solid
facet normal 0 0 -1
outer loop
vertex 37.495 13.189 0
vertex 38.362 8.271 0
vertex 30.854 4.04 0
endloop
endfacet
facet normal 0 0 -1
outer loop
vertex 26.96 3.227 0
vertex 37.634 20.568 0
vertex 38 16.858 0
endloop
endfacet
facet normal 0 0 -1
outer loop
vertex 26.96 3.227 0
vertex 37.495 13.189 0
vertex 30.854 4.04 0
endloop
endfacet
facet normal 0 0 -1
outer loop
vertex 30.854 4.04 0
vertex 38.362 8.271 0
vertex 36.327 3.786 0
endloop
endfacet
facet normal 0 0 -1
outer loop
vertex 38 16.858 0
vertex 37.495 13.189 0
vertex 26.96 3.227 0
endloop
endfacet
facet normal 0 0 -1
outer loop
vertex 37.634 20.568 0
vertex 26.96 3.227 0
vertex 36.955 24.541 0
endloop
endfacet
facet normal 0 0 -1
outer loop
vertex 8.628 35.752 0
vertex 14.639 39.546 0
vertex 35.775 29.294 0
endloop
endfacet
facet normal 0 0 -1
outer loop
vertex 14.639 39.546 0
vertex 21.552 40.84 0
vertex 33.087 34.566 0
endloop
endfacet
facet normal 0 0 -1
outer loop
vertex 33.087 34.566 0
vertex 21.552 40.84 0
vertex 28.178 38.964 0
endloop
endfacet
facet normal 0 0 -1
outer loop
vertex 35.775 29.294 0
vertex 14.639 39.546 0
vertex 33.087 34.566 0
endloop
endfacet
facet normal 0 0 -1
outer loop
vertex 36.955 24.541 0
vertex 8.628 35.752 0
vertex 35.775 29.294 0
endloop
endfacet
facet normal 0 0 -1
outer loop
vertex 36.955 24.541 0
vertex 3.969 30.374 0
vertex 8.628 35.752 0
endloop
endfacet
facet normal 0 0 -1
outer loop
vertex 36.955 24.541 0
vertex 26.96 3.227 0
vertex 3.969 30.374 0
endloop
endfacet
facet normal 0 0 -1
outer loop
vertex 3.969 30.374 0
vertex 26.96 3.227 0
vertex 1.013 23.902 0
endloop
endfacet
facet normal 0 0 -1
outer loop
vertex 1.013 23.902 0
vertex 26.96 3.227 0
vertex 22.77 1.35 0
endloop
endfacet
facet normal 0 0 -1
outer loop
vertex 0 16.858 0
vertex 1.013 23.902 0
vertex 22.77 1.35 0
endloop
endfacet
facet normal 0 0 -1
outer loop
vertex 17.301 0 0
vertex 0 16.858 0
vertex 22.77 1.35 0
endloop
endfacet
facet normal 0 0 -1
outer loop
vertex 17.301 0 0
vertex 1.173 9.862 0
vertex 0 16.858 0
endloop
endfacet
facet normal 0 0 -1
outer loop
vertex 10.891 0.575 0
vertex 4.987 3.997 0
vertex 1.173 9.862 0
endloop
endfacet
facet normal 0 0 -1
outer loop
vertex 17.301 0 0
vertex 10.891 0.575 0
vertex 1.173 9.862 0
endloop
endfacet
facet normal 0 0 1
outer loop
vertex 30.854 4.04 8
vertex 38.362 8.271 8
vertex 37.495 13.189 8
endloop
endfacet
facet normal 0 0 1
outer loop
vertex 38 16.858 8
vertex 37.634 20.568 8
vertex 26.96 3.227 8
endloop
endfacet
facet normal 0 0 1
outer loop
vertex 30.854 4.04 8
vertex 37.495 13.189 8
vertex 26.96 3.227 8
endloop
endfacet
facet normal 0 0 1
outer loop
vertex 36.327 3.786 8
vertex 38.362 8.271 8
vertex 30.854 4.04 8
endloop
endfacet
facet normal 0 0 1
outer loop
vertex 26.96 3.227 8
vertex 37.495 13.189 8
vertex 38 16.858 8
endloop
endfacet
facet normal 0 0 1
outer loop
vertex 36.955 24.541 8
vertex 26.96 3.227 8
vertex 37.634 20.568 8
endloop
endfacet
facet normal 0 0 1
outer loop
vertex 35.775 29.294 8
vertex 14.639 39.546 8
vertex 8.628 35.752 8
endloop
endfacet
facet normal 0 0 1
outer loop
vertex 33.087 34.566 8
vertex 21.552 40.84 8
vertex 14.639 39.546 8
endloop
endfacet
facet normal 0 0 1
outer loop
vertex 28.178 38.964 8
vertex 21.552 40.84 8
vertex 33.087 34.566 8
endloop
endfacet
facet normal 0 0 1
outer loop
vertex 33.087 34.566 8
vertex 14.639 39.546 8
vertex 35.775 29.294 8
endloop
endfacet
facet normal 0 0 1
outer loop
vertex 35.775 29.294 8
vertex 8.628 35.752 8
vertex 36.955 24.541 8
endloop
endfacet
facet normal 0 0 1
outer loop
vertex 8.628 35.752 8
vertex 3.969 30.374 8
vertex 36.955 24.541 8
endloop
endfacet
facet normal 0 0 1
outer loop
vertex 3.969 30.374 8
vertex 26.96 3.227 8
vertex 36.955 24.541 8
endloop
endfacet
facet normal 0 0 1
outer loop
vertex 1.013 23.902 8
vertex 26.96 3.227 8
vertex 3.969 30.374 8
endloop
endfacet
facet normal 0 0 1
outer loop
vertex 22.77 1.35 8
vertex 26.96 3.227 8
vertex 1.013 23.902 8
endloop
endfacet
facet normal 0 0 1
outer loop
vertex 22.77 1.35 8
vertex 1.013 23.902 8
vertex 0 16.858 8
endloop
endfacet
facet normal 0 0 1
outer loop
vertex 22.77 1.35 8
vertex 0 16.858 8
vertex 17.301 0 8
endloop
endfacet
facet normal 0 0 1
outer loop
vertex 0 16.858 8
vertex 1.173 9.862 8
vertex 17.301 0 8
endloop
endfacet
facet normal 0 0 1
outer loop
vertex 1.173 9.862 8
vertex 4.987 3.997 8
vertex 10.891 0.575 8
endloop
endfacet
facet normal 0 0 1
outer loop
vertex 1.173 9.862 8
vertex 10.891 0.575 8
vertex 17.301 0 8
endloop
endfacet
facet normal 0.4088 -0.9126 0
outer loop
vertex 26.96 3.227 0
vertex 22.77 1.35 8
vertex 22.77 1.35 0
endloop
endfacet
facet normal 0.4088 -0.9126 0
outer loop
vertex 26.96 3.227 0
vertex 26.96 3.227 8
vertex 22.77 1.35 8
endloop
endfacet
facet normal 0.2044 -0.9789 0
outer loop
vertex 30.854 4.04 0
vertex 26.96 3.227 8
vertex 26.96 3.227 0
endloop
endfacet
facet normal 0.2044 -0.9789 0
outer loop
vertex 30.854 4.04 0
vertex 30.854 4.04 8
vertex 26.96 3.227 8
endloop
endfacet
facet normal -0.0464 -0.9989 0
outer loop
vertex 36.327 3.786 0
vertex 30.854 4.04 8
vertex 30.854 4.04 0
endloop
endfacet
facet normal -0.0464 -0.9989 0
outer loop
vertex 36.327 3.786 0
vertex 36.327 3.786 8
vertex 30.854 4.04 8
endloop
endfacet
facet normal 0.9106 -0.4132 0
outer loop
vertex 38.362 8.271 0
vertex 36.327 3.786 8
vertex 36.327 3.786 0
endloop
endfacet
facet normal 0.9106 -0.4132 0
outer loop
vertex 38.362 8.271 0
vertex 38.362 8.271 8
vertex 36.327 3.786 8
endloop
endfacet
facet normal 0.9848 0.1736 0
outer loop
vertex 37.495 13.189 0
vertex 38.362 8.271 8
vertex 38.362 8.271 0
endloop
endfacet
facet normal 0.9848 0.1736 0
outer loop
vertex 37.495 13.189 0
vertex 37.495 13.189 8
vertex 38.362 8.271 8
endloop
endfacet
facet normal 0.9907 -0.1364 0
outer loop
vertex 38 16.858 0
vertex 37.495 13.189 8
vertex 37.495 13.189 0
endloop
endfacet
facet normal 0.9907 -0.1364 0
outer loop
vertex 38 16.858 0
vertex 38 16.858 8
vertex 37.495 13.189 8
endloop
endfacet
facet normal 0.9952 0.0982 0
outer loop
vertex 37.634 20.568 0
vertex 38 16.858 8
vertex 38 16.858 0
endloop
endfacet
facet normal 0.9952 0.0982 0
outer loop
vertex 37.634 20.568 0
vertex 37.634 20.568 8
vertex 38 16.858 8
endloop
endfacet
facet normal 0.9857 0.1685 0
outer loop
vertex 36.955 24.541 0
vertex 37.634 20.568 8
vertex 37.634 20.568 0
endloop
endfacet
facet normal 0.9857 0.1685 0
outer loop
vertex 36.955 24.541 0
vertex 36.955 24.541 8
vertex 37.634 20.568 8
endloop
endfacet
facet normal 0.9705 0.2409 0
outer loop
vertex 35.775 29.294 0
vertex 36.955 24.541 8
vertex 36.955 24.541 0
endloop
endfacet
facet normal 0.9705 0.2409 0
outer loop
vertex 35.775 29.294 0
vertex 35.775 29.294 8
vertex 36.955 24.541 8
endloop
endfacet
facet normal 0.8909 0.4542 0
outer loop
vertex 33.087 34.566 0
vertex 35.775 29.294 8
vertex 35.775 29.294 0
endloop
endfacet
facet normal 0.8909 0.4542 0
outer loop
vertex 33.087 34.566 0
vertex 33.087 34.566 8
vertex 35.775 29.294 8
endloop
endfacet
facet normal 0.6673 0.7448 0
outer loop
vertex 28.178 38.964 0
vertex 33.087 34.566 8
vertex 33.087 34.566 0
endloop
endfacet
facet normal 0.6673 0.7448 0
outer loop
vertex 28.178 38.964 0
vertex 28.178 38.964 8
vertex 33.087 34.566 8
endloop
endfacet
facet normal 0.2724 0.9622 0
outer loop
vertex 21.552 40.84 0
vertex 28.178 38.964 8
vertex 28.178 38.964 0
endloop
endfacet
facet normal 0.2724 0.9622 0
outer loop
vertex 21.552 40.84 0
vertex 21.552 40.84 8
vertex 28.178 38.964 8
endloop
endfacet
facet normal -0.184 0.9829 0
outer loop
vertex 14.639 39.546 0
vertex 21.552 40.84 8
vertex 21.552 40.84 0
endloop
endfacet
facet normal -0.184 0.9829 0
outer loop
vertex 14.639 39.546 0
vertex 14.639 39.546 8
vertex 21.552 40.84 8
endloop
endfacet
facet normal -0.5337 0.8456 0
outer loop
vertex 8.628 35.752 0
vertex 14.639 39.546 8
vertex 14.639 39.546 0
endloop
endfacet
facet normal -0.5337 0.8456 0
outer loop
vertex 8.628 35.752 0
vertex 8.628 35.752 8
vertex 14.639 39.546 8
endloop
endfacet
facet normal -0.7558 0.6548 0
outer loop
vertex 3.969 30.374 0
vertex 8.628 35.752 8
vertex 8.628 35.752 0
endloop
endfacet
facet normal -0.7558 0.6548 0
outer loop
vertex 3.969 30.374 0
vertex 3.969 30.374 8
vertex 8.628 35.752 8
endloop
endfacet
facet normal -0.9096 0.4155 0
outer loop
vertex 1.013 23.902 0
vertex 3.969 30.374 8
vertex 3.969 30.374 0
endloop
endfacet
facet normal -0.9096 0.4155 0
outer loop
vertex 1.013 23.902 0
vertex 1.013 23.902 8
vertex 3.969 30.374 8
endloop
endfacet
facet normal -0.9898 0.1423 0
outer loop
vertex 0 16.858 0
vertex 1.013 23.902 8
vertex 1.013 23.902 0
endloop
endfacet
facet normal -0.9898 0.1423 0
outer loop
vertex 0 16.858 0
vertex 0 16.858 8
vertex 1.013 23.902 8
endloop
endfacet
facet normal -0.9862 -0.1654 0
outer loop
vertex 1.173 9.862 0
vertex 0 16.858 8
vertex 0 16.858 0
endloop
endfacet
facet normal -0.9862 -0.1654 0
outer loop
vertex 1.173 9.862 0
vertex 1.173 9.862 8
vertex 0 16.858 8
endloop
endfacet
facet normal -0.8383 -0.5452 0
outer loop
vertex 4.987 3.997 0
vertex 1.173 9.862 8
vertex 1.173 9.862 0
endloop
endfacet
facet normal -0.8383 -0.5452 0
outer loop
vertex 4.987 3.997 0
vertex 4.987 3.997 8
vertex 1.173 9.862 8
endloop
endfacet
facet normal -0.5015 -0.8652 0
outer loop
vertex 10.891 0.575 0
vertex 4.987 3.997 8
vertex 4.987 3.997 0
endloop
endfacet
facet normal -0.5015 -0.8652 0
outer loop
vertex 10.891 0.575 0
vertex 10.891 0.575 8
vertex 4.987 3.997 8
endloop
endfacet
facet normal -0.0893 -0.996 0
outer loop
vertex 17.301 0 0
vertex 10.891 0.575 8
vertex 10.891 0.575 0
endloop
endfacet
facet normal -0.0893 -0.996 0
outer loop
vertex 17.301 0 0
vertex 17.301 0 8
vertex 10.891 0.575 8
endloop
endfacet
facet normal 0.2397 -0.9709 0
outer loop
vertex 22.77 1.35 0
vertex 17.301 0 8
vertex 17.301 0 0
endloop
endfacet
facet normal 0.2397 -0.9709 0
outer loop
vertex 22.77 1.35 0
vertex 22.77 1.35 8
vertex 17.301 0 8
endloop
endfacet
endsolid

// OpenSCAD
$fn = 32;

// ----------------------------------------------------------------------
// Cam disc: base radius 13.0 mm, lift 12.0 mm, 22 profile points
// ----------------------------------------------------------------------

// --- parameters (mm) ---
profile_height = 8;       // extrusion height
profile_points = 22;      // points of the closed outline

profile = [[38, 16.858], [37.634, 20.568], [36.955, 24.541], [35.775, 29.294], [33.087, 34.566], [28.178, 38.964], [21.552, 40.84], [14.639, 39.546], [8.628, 35.752], [3.969, 30.374], [1.013, 23.902], [0, 16.858], [1.173, 9.862], [4.987, 3.997], [10.891, 0.575], [17.301, 0], [22.77, 1.35], [26.96, 3.227], [30.854, 4.04], [36.327, 3.786], [38.362, 8.271], [37.495, 13.189]];  // single closed polygon, 22 points, counter clockwise

// --- the one profile operation ---
linear_extrude(height = profile_height) polygon(points = profile);
